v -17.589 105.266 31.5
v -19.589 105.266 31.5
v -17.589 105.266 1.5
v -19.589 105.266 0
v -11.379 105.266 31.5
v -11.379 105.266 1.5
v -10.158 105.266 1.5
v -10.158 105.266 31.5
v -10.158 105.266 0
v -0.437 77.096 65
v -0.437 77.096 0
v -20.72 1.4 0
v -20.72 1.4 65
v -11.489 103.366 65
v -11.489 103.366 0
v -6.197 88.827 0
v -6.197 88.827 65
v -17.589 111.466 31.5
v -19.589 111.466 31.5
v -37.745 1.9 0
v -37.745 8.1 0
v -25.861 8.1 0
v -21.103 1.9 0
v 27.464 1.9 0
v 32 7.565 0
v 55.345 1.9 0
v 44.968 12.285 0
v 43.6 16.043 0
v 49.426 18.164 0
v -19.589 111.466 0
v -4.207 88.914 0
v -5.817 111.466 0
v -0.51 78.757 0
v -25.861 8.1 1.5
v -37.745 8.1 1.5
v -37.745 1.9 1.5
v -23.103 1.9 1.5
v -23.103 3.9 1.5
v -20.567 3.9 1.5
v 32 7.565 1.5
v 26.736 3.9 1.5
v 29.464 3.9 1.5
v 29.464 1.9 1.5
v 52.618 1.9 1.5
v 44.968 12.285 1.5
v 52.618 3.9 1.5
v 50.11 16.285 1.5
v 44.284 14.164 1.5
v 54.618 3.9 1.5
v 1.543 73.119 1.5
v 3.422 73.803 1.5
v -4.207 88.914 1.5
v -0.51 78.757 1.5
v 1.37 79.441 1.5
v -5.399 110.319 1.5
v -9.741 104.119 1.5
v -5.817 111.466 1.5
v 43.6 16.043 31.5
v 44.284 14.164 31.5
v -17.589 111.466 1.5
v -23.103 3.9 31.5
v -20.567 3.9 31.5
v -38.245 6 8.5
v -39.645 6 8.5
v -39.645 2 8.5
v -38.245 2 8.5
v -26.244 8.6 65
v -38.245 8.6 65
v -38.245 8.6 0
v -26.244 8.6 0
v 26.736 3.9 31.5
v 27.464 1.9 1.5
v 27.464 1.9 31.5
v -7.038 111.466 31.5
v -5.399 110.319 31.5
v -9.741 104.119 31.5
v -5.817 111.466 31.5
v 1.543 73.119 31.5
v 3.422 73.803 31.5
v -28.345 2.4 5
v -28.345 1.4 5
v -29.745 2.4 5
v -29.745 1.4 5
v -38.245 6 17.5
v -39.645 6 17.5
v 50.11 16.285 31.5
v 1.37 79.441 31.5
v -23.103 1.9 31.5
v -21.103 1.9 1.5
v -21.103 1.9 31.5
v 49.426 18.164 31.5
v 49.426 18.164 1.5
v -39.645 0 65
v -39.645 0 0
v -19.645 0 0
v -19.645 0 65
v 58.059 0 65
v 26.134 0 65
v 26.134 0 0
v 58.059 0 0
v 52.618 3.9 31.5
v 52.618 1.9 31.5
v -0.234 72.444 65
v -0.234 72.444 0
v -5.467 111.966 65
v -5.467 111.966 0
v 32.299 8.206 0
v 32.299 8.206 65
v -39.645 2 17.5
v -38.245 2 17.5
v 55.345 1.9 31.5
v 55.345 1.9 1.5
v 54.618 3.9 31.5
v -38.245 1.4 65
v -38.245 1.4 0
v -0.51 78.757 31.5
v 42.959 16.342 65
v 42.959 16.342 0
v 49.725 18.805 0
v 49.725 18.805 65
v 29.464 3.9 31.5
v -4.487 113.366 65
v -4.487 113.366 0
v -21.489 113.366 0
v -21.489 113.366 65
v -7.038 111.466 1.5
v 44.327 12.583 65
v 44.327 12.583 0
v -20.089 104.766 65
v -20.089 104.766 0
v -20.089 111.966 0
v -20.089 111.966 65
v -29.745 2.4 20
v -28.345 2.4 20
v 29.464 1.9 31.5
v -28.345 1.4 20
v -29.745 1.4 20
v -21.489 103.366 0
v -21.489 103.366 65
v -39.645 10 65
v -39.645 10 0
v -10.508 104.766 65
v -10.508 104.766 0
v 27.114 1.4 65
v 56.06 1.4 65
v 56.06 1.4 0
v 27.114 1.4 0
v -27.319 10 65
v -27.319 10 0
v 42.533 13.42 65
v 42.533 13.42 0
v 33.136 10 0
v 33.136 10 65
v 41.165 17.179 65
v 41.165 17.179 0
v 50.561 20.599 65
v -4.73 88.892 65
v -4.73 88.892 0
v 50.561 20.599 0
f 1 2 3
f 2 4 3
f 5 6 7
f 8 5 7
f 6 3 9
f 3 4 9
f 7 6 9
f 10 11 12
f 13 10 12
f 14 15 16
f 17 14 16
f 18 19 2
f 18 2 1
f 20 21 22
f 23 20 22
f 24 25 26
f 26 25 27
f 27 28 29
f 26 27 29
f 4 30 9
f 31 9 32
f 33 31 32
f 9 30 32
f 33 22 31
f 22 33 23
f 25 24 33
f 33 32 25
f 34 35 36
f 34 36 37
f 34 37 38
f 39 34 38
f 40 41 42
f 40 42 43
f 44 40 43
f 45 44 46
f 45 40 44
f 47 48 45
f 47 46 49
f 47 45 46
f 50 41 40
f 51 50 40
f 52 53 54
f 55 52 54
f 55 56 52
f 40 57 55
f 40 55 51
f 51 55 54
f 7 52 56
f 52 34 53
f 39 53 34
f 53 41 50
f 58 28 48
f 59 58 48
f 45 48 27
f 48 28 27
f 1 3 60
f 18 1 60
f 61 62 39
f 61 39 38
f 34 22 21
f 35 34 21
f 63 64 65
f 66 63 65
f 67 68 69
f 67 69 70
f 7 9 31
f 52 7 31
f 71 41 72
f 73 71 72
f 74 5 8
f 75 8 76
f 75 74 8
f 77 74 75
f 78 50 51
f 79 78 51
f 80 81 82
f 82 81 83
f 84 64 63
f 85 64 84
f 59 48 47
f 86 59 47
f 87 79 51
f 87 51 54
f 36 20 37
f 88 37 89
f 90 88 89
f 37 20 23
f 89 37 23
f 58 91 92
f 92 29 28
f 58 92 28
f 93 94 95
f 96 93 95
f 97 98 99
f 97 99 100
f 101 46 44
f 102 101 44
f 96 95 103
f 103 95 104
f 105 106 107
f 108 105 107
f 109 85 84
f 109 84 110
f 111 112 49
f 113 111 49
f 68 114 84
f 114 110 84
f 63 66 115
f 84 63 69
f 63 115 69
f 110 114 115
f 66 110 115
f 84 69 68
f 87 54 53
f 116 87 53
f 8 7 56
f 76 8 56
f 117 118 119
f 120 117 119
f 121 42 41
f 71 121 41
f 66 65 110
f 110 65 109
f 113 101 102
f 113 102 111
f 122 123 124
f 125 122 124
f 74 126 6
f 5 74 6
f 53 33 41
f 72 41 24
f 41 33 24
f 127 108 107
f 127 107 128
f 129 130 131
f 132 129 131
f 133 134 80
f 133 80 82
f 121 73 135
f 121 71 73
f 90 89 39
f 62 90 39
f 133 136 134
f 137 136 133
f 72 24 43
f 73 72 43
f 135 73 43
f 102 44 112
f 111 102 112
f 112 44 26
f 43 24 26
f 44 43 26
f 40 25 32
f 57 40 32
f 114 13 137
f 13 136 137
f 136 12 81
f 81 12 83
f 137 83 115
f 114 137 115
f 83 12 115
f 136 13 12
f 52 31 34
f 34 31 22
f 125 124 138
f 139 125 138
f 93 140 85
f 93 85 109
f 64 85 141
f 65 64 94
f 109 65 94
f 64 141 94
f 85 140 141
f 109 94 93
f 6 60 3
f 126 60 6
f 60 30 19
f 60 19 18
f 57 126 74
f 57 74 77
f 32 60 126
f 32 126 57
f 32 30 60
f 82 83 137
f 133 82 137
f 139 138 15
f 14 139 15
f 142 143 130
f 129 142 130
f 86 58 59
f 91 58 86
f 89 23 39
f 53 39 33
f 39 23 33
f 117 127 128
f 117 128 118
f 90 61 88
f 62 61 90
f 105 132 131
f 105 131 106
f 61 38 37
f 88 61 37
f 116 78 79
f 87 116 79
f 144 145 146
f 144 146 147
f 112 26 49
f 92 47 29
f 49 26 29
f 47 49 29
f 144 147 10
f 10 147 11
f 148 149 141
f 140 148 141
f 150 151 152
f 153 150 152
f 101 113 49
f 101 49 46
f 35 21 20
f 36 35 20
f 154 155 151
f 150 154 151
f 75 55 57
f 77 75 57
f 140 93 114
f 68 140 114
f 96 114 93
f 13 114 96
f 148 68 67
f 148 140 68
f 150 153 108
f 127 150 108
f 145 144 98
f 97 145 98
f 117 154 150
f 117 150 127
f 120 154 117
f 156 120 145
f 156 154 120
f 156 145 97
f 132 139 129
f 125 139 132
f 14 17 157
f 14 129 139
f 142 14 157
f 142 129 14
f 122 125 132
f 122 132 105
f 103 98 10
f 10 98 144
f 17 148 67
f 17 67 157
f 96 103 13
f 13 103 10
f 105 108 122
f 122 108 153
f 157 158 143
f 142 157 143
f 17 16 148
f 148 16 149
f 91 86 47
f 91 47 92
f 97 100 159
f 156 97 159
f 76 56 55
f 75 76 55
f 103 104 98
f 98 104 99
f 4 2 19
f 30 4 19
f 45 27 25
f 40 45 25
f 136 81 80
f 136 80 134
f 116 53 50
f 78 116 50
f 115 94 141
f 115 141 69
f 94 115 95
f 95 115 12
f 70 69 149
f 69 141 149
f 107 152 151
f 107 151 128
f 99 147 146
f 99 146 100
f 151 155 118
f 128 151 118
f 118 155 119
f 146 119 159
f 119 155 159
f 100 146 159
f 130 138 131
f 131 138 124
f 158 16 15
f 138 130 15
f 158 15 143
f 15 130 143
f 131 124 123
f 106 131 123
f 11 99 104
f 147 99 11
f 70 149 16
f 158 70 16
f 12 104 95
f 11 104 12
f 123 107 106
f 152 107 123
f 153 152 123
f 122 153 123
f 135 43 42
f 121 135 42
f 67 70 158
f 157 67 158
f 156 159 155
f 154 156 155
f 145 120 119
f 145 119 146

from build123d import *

# Parameters (mm, degrees)
F1_DEPTH = 65
F2_DEPTH = 1.5
F3_W     = 2
F3_H     = 6.2
F4_DEPTH = 30
F5_W     = 1.4
F5_H     = 15
F6_DEPTH = 1
F7_W     = 4
F7_H     = 9
F8_DEPTH = 1.4


with BuildPart() as f1:
    # F0 (on Top) → F1 (new body)
    with BuildSketch(Plane.XY):
        Polygon((-0.233996, 72.444437), (26.133623, 0), (58.058956, 0), (50.56147, 20.599173), (41.164544, 17.178972), (42.532624, 13.420201), (33.135698, 10), (-4.486518, 113.366188), (-21.488593, 113.366188), (-21.488593, 103.366188), (-11.488593, 103.366188), (-6.196935, 88.827478), (-27.318694, 10), (-39.645425, 10), (-39.645425, 0), (-19.645425, 0), align=None)
        Polygon((-10.508303, 104.766188), (-20.088593, 104.766188), (-20.088593, 111.966188), (-5.466808, 111.966188), (32.298956, 8.205602), (44.327022, 12.58346), (42.958941, 16.34223), (49.724728, 18.804775), (56.059548, 1.4), (27.113913, 1.4), (-0.437076, 77.095719), (-20.719682, 1.4), (-38.245425, 1.4), (-38.245425, 8.6), (-26.244437, 8.6), (-4.730392, 88.891509), align=None, mode=Mode.SUBTRACT)
    extrude(amount=F1_DEPTH)

    # F5 (on face) → F6 (join)
    with BuildSketch(Plane(origin=(0, 1.4, 0), x_dir=(-1, 0, 0), z_dir=(0, 1, 0))):
        with Locations((29.045425, 12.5)):
            Rectangle(F5_W, F5_H)
    extrude(amount=F6_DEPTH)

    # F7 (on face) → F8 (cut, through all)
    with BuildSketch(Plane(origin=(-39.645425, 0, 0), x_dir=(0, -1, 0), z_dir=(-1, 0, 0))):
        with Locations((-4, 13)):
            Rectangle(F7_W, F7_H)
    extrude(amount=-F8_DEPTH, mode=Mode.SUBTRACT)


with BuildPart() as f2:
    # F0 (on Top) → F2 (new body)
    with BuildSketch(Plane.XY):
        Polygon((-19.588593, 105.266188), (-10.158199, 105.266188), (-4.206626, 88.914377), (-25.860773, 8.1), (-37.745425, 8.1), (-37.745425, 1.9), (-21.103346, 1.9), (-0.509604, 78.756891), (27.464017, 1.9), (55.345474, 1.9), (49.425892, 18.163919), (43.599798, 16.043394), (44.967878, 12.284624), (32.00012, 7.564746), (-5.816912, 111.466188), (-19.588593, 111.466188), align=None)
    extrude(amount=F2_DEPTH)

    # F3 (on face) → F4 (join)
    with BuildSketch(Plane.XY.offset(1.5)):
        with Locations((-18.588593, 108.366188)):
            Rectangle(F3_W, F3_H)
        Polygon((-5.816912, 111.466188), (-7.037687, 111.466188), (-11.378974, 105.266188), (-10.158199, 105.266188), (-9.740669, 104.119035), (-5.399383, 110.319035), align=None)
        Polygon((1.369781, 79.440932), (-0.509604, 78.756891), (1.542517, 73.118736), (3.421902, 73.802776), align=None)
        Polygon((43.599798, 16.043394), (44.283838, 14.164009), (50.109932, 16.284534), (49.425892, 18.163919), align=None)
        Polygon((55.345474, 1.9), (54.617534, 3.9), (52.617534, 3.9), (52.617534, 1.9), align=None)
        Polygon((27.464017, 1.9), (29.464017, 1.9), (29.464017, 3.9), (26.736076, 3.9), align=None)
        Polygon((-23.103346, 3.9), (-23.103346, 1.9), (-21.103346, 1.9), (-20.567447, 3.9), align=None)
    extrude(amount=F4_DEPTH)


solid = Compound([f1.part, f2.part])
